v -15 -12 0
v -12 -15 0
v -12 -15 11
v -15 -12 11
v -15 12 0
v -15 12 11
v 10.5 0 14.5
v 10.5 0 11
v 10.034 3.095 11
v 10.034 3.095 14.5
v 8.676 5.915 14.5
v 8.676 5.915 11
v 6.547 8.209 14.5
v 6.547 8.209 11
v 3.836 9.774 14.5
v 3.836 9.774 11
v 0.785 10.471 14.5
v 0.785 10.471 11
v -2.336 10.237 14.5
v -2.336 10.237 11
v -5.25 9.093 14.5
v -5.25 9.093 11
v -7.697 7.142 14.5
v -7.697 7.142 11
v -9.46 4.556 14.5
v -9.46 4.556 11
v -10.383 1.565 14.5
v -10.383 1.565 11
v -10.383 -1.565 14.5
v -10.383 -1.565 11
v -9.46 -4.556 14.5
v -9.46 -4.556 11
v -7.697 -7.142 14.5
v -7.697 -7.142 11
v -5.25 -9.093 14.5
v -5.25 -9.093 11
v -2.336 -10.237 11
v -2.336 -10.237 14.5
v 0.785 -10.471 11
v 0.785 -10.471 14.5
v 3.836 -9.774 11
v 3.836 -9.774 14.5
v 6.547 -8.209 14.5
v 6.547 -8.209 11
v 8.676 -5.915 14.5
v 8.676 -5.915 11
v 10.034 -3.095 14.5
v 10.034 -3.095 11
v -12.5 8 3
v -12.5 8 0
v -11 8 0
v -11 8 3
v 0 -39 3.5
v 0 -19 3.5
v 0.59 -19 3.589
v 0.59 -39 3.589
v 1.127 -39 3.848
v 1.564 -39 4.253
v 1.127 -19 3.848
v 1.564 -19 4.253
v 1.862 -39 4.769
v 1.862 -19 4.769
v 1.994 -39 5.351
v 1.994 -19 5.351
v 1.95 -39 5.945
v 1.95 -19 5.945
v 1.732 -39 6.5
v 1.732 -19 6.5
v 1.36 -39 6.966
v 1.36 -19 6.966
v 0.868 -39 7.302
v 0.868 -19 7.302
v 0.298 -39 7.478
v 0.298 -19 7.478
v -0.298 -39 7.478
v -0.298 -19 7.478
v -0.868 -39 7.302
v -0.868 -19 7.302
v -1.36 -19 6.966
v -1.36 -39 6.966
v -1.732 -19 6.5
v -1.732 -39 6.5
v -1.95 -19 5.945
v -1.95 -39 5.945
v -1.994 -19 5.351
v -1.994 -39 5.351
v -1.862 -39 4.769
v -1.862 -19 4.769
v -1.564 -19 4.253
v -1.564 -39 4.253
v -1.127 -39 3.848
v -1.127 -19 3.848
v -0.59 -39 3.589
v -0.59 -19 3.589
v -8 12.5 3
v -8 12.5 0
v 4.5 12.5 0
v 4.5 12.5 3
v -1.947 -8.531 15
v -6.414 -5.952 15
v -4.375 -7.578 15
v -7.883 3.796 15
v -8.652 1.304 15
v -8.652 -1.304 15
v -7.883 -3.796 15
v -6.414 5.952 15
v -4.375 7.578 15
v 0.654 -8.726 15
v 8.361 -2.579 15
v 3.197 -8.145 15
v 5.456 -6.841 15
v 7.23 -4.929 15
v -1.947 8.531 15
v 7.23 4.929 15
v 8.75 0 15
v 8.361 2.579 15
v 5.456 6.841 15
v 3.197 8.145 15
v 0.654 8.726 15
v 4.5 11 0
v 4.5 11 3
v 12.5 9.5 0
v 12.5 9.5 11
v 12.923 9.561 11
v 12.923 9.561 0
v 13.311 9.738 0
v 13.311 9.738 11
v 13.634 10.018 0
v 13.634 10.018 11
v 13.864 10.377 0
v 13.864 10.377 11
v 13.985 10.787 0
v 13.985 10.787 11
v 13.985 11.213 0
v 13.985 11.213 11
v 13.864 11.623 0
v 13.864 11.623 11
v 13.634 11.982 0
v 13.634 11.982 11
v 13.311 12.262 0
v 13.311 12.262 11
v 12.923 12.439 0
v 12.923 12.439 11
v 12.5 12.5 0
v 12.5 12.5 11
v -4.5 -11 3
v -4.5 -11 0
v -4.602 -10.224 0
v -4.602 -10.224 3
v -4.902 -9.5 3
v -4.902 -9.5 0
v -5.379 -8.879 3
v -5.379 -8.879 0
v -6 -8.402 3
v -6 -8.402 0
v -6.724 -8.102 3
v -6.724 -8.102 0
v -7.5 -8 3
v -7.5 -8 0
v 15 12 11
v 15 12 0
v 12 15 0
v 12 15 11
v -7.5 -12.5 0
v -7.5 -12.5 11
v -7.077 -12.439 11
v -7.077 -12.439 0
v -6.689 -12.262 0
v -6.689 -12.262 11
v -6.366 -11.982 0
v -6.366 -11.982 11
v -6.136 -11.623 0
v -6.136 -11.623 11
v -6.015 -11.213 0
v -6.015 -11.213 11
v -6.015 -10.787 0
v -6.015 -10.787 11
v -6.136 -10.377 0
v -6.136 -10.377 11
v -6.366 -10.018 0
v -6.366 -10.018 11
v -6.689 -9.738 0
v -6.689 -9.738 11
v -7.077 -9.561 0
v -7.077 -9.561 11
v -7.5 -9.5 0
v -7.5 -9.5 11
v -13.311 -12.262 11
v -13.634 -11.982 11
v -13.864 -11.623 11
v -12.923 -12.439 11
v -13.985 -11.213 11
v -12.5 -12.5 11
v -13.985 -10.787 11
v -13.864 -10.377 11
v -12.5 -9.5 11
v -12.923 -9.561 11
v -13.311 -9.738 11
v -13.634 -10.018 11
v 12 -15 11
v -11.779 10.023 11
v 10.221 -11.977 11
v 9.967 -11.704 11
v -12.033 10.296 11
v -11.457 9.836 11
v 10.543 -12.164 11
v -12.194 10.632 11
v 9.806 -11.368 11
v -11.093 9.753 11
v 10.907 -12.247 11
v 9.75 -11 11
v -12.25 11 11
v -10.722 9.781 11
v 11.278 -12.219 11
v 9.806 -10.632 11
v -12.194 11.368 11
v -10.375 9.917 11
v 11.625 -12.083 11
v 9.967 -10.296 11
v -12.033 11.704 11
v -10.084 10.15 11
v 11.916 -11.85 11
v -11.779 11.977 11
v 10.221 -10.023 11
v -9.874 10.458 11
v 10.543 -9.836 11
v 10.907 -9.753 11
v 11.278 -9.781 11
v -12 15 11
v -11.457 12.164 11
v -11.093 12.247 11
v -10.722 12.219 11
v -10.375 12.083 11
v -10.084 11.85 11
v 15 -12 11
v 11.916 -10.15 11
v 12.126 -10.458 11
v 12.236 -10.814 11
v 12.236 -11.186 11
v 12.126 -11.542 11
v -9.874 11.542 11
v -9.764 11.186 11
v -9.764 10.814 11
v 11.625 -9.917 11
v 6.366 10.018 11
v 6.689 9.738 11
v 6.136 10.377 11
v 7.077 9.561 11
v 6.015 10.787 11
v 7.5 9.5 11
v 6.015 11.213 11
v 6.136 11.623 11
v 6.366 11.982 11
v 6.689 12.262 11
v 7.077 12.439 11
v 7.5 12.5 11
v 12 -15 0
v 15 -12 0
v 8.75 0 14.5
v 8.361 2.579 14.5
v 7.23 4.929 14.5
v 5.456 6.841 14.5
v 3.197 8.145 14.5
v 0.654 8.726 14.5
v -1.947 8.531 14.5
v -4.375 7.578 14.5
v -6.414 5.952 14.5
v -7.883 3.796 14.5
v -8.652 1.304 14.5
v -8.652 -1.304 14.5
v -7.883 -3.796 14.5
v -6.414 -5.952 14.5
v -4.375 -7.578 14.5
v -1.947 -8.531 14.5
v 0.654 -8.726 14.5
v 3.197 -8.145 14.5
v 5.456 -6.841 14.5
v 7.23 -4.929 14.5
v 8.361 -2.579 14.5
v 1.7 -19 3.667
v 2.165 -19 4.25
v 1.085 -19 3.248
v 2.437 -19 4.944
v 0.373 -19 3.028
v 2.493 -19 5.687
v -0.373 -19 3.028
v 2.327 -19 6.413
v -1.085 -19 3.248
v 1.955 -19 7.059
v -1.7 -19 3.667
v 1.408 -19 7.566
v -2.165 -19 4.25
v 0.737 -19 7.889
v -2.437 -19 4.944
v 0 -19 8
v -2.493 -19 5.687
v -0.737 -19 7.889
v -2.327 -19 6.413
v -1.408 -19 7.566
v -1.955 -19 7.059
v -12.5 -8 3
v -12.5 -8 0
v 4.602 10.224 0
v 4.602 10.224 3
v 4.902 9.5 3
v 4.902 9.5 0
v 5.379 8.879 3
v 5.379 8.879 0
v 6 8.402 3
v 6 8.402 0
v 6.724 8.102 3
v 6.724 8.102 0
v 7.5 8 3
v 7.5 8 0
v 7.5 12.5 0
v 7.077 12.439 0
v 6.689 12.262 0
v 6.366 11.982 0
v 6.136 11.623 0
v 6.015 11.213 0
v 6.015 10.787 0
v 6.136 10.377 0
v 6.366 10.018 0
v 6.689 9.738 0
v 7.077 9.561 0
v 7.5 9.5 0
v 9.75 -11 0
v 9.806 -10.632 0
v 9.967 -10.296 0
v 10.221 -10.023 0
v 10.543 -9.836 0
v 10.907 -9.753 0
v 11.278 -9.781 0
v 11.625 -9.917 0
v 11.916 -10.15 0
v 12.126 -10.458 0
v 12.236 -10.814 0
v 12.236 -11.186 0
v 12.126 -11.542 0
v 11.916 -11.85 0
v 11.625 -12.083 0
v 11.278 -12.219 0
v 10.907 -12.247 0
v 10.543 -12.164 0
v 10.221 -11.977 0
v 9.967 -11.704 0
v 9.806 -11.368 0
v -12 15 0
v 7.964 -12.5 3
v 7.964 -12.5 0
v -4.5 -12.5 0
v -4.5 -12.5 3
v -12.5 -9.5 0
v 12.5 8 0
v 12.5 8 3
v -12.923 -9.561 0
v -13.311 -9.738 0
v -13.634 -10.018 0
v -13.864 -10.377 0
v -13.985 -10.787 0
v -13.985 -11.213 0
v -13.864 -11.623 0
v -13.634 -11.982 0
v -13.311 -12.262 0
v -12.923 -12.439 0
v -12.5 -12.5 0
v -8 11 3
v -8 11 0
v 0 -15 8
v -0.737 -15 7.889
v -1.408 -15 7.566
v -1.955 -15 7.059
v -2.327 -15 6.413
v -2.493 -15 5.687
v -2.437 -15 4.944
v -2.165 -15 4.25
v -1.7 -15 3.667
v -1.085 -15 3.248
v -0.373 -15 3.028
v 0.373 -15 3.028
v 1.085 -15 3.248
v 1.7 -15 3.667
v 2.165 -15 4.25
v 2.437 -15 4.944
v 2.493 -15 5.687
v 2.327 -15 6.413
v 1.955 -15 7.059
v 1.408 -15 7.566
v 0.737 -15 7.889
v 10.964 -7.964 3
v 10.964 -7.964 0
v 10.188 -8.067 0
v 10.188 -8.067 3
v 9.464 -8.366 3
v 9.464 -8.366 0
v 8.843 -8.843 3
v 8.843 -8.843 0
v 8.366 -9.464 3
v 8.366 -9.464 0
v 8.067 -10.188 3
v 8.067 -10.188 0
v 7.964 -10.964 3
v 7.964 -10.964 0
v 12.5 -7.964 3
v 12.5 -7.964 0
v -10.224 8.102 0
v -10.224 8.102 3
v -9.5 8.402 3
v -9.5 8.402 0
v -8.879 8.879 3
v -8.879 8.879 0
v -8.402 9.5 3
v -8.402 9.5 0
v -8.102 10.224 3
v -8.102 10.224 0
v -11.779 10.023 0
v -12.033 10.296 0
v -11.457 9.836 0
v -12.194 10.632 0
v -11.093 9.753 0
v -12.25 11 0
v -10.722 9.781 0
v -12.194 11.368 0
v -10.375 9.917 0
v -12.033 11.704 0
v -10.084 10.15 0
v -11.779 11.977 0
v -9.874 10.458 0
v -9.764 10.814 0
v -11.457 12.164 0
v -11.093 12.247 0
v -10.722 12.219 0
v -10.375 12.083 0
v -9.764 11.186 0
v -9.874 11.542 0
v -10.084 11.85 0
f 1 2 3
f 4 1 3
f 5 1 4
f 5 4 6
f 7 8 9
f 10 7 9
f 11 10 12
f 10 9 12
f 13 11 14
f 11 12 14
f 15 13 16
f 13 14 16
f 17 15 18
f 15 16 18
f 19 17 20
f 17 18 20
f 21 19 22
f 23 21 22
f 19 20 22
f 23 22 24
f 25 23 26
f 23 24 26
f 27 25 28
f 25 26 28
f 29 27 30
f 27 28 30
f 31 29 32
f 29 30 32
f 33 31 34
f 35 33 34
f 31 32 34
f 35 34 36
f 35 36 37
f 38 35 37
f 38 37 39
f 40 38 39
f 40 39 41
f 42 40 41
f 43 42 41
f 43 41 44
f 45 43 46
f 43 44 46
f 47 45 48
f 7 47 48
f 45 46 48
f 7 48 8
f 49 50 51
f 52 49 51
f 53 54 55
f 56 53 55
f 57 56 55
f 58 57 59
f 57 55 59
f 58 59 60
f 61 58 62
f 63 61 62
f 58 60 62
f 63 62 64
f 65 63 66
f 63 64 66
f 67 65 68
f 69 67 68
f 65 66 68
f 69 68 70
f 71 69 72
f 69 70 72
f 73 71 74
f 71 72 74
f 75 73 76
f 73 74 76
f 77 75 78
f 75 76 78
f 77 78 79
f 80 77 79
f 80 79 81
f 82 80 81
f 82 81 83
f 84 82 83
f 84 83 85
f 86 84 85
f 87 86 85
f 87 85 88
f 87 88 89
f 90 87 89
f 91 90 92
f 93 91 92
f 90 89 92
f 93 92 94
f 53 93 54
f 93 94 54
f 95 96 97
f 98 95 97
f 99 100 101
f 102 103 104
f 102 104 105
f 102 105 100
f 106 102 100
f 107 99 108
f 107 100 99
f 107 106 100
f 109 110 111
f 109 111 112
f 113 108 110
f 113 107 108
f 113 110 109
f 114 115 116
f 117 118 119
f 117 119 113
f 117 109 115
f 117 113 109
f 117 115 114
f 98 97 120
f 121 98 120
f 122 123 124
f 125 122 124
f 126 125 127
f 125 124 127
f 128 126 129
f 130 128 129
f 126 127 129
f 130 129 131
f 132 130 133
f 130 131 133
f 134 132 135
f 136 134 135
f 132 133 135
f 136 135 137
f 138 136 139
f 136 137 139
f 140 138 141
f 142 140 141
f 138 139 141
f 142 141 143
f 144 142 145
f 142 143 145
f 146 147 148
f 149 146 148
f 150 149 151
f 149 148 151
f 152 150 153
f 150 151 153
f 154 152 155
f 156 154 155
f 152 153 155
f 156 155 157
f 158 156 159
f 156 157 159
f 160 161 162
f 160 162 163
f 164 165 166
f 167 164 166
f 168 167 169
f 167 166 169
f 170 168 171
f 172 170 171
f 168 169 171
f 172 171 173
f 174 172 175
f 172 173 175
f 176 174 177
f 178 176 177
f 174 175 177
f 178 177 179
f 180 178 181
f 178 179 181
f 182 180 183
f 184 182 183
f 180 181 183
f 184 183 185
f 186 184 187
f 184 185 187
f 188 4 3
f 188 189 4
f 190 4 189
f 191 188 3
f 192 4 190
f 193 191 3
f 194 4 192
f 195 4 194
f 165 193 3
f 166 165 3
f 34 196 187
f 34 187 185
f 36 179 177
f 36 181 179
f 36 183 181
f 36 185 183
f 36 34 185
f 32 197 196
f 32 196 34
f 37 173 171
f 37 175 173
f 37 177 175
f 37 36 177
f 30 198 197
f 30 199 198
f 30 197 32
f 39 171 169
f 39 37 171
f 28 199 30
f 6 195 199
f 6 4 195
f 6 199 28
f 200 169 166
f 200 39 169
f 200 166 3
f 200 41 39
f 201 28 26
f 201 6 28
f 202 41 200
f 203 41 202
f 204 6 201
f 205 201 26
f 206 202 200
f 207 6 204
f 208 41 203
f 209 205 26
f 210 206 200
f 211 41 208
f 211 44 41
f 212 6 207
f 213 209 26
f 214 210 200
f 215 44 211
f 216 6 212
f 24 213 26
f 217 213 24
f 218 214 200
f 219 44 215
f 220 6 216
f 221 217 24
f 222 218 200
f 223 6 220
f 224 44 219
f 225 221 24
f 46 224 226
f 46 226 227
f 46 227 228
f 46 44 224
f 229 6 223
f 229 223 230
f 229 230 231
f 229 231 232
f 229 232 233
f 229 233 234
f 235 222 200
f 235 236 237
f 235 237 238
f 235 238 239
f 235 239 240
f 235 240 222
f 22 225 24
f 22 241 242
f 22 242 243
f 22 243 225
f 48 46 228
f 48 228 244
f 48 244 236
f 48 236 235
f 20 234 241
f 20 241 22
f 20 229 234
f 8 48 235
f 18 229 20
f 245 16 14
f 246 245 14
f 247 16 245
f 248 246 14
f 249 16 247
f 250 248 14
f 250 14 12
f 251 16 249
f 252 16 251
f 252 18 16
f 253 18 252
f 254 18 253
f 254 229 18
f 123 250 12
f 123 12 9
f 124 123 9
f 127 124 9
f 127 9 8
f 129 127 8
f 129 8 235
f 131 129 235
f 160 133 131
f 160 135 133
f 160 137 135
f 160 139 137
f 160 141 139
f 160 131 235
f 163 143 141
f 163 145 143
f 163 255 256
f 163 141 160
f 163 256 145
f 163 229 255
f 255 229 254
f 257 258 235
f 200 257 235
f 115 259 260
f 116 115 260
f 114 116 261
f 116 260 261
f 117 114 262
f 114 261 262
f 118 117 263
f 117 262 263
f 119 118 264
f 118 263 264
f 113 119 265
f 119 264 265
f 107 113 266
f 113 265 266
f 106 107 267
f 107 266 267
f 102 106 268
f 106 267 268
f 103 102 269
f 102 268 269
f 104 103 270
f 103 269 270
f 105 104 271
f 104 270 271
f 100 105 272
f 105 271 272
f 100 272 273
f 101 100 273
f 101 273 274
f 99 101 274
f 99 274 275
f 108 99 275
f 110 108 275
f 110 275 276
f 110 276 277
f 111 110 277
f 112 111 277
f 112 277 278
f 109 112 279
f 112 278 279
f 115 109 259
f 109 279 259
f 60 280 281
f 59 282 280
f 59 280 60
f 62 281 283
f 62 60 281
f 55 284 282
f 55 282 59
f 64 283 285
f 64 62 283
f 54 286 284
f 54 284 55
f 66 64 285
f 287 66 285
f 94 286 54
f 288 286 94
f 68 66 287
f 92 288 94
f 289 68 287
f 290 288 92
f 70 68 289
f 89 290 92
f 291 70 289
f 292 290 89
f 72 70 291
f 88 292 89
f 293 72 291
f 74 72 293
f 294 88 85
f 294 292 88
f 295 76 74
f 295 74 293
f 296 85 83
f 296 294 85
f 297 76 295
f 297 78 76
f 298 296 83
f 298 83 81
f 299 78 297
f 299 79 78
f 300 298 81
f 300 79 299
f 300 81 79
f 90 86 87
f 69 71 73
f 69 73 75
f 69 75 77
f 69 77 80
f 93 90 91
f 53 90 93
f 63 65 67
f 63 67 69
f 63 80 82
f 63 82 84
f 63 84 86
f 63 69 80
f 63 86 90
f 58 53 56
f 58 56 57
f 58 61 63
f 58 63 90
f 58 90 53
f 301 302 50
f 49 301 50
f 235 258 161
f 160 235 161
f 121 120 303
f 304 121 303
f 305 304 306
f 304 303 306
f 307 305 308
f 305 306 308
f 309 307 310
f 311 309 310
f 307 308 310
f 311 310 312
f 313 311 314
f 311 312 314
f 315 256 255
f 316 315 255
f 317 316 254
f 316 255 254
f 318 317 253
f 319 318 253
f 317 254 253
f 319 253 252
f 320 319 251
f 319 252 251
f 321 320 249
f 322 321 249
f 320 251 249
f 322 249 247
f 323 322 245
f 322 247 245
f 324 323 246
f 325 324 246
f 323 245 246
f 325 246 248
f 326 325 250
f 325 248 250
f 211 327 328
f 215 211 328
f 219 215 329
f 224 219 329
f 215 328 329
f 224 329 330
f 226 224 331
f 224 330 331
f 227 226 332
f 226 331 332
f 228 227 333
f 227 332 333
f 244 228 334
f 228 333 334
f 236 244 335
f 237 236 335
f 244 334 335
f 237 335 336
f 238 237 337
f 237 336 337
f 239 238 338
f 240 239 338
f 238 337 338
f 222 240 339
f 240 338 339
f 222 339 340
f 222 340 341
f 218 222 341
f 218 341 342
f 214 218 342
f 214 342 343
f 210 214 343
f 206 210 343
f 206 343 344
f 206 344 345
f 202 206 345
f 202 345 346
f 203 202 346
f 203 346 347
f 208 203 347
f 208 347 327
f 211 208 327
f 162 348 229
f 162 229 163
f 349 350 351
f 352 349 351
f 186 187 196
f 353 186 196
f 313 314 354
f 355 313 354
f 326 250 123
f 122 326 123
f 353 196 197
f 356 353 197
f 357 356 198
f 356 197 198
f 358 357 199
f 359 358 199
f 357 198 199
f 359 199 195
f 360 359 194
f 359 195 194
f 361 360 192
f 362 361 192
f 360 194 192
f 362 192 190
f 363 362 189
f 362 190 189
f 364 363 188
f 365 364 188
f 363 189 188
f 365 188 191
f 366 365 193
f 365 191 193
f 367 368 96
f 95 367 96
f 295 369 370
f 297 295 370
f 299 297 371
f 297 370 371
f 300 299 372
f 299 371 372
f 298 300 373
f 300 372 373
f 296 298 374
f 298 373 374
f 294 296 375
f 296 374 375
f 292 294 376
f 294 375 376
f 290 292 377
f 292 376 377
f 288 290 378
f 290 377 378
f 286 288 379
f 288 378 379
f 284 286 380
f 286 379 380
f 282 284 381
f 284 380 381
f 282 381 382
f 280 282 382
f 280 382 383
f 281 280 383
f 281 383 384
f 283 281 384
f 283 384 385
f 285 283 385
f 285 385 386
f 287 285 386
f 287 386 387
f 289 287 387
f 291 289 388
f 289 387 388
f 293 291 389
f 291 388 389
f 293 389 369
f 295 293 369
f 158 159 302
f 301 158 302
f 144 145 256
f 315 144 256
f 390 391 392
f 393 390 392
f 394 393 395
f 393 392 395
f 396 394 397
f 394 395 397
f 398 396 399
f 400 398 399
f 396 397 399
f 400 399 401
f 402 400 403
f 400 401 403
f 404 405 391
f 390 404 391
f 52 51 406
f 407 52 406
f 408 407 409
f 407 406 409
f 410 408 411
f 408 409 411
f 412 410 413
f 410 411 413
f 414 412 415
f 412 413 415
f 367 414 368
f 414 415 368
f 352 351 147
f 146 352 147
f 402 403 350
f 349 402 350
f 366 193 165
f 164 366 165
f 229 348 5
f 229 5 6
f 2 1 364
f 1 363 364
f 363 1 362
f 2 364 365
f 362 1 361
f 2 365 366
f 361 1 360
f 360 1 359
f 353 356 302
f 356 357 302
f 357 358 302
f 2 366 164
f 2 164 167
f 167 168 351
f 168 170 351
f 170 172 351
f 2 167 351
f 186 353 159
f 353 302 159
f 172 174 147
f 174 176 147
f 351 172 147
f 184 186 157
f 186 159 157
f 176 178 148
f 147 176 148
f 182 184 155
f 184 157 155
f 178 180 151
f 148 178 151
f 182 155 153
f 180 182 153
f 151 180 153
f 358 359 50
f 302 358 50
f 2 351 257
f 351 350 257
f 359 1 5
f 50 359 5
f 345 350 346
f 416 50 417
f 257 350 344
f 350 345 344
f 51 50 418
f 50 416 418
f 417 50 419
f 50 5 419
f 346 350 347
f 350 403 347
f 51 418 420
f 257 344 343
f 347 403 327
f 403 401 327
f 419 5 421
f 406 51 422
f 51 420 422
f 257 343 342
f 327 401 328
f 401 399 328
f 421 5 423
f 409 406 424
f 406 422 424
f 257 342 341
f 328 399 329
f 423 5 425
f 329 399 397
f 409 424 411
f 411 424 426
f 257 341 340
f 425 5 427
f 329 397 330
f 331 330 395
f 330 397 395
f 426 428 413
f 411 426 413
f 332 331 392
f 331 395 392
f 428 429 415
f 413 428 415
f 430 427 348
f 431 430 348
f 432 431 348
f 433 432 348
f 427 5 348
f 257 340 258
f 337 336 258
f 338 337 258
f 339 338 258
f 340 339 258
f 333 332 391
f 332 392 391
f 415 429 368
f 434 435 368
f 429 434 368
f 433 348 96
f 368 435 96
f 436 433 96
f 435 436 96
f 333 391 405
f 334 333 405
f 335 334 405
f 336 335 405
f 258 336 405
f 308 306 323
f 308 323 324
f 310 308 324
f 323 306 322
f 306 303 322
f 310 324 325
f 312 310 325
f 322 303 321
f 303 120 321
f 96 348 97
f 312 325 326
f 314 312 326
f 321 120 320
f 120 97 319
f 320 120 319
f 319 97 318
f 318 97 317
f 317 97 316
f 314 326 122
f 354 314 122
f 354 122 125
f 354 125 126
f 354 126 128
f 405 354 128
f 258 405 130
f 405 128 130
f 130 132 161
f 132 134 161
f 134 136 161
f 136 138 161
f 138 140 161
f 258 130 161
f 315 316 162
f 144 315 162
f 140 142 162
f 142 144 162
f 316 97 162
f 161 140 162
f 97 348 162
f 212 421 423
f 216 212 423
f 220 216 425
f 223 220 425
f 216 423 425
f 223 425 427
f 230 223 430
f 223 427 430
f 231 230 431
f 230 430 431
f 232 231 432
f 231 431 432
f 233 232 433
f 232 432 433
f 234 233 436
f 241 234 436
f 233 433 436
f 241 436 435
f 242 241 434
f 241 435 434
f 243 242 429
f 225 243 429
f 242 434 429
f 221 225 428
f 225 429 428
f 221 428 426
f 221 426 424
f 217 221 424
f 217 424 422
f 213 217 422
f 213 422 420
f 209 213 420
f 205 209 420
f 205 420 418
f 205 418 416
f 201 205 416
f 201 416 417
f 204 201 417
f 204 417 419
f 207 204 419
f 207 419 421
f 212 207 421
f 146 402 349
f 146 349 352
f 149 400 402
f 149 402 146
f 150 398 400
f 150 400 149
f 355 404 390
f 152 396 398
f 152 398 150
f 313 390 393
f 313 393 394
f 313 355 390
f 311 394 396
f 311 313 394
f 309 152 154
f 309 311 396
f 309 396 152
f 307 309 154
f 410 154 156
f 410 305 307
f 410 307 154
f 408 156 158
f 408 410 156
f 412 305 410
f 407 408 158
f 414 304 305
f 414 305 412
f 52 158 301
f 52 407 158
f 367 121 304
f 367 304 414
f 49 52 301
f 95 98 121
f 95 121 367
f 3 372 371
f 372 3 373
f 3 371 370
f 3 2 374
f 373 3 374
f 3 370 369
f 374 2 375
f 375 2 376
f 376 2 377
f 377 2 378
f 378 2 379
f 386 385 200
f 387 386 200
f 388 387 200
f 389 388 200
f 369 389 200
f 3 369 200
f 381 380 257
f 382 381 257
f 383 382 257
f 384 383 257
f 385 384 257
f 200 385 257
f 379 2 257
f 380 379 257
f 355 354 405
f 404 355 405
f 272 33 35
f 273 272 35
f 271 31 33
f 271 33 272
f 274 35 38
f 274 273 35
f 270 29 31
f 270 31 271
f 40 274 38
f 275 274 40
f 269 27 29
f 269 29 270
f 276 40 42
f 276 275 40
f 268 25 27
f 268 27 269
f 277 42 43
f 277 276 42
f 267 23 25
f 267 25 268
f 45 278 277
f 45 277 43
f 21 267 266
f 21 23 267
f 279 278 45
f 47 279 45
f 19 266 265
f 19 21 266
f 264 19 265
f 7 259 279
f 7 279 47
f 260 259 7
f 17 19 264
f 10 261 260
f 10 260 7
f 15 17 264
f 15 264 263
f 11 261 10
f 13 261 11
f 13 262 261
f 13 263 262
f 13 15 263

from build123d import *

# Parameters (mm, degrees)
ESQUISSE1_W             = 30
ESQUISSE1_H             = 30
BOSS_EXTRU_1_DEPTH      = 11
TROU_TARAUD_M31_D       = 2.5
ENL_V_MAT_EXTRU_1_REACH = 25.896
ESQUISSE6_R             = 10.5
BOSS_EXTRU_2_DEPTH      = 3.5
ESQUISSE7_R             = 8.75
BOSS_EXTRU_3_DEPTH      = 0.5
ESQUISSE8_R             = 2.5
BOSS_EXTRU_4_DEPTH      = 4
ESQUISSE9_R             = 2
BOSS_EXTRU_5_DEPTH      = 20
CHANFREIN1_SIZE         = 3
ENL_V_MAT_EXTRU_2_DEPTH = 3


with BuildPart() as part:
    # Esquisse1 → Boss.-Extru.1 (new body)
    with BuildSketch(Plane.XY):
        Rectangle(ESQUISSE1_W, ESQUISSE1_H)
    extrude(amount=BOSS_EXTRU_1_DEPTH)

    # Trou taraudé M31 (through all)
    with Locations(Plane.XY.offset(11)):
        with Locations((11, -11), (-11, 11)):
            Hole(TROU_TARAUD_M31_D / 2)

    # Esquisse5 → Enlèv. mat.-Extru.1 (cut, up to next)
    with BuildSketch(Plane.XY.offset(11), mode=Mode.PRIVATE) as enl_v_mat_extru_1_sk1:
        with BuildLine():
            Line((12.5, 12.5), (7.5, 12.5))
            ThreePointArc((7.5, 12.5), (6, 11), (7.5, 9.5))
            Line((7.5, 9.5), (12.5, 9.5))
            ThreePointArc((12.5, 9.5), (14, 11), (12.5, 12.5))
        make_face()
    enl_v_mat_extru_1_tool1 = extrude(enl_v_mat_extru_1_sk1.sketch, amount=-ENL_V_MAT_EXTRU_1_REACH, mode=Mode.PRIVATE) & part.part
    # Esquisse5 → Enlèv. mat.-Extru.1 (cut, up to next)
    with BuildSketch(Plane.XY.offset(11), mode=Mode.PRIVATE) as enl_v_mat_extru_1_sk2:
        with BuildLine():
            Line((-7.5, -9.5), (-12.5, -9.5))
            ThreePointArc((-12.5, -9.5), (-14, -11), (-12.5, -12.5))
            Line((-12.5, -12.5), (-7.5, -12.5))
            ThreePointArc((-7.5, -12.5), (-6, -11), (-7.5, -9.5))
        make_face()
    enl_v_mat_extru_1_tool2 = extrude(enl_v_mat_extru_1_sk2.sketch, amount=-ENL_V_MAT_EXTRU_1_REACH, mode=Mode.PRIVATE) & part.part
    add(enl_v_mat_extru_1_tool1.solids().sort_by_distance((10, 11, 11))[0], mode=Mode.SUBTRACT)
    add(enl_v_mat_extru_1_tool2.solids().sort_by_distance((-10, -11, 11))[0], mode=Mode.SUBTRACT)

    # Esquisse6 → Boss.-Extru.2 (add)
    with BuildSketch(Plane.XY.offset(11)):
        Circle(ESQUISSE6_R)
    extrude(amount=BOSS_EXTRU_2_DEPTH)

    # Esquisse7 → Boss.-Extru.3 (add)
    with BuildSketch(Plane.XY.offset(14.5)):
        Circle(ESQUISSE7_R)
    extrude(amount=BOSS_EXTRU_3_DEPTH)

    # Esquisse8 → Boss.-Extru.4 (add)
    with BuildSketch(Plane(origin=(0, -15, 0), x_dir=(-1, 0, 0), z_dir=(0, -1, 0))):
        with Locations(Location((0, -5.5, 0), (0, 0, 270))):
            Circle(ESQUISSE8_R)
    extrude(amount=BOSS_EXTRU_4_DEPTH)

    # Esquisse9 → Boss.-Extru.5 (add)
    with BuildSketch(Plane(origin=(0, -19, 0), x_dir=(-1, 0, 0), z_dir=(0, -1, 0))):
        with Locations(Location((0, -5.5, 0), (0, 0, 90))):
            Circle(ESQUISSE9_R)
    extrude(amount=BOSS_EXTRU_5_DEPTH)

    # Chanfrein1
    chanfrein1_edges = [part.edges().sort_by_distance(p)[0] for p in [
        (-15, 15, 5.5),
        (15, 15, 5.5),
        (15, -15, 5.5),
        (-15, -15, 5.5),
    ]]
    chamfer(chanfrein1_edges, length=CHANFREIN1_SIZE)

    # Esquisse10 → Enlèv. mat.-Extru.2 (cut)
    with BuildSketch(Plane(origin=(0, 0, 0), x_dir=(-1, 0, 0), z_dir=(0, 0, -1))):
        with BuildLine():
            Line((-7.5, 8), (-12.5, 8))
            Line((-12.5, 8), (-12.5, -7.964466094))
            Line((-12.5, -7.964466094), (-10.964466094, -7.964466094))
            ThreePointArc((-10.964466094, -7.964466094), (-8.843145751, -8.843145751), (-7.964466094, -10.964466094))
            Line((-7.964466094, -10.964466094), (-7.964466094, -12.5))
            Line((-7.964466094, -12.5), (4.5, -12.5))
            Line((4.5, -12.5), (4.5, -11))
            ThreePointArc((4.5, -11), (5.378679656, -8.878679656), (7.5, -8))
            Line((7.5, -8), (12.5, -8))
            Line((12.5, -8), (12.5, 8))
            Line((12.5, 8), (11, 8))
            ThreePointArc((11, 8), (8.878679656, 8.878679656), (8, 11))
            Line((8, 11), (8, 12.5))
            Line((8, 12.5), (-4.5, 12.5))
            Line((-4.5, 12.5), (-4.5, 11))
            ThreePointArc((-4.5, 11), (-5.378679656, 8.878679656), (-7.5, 8))
        make_face()
    extrude(amount=-ENL_V_MAT_EXTRU_2_DEPTH, mode=Mode.SUBTRACT)


solid = part.part
